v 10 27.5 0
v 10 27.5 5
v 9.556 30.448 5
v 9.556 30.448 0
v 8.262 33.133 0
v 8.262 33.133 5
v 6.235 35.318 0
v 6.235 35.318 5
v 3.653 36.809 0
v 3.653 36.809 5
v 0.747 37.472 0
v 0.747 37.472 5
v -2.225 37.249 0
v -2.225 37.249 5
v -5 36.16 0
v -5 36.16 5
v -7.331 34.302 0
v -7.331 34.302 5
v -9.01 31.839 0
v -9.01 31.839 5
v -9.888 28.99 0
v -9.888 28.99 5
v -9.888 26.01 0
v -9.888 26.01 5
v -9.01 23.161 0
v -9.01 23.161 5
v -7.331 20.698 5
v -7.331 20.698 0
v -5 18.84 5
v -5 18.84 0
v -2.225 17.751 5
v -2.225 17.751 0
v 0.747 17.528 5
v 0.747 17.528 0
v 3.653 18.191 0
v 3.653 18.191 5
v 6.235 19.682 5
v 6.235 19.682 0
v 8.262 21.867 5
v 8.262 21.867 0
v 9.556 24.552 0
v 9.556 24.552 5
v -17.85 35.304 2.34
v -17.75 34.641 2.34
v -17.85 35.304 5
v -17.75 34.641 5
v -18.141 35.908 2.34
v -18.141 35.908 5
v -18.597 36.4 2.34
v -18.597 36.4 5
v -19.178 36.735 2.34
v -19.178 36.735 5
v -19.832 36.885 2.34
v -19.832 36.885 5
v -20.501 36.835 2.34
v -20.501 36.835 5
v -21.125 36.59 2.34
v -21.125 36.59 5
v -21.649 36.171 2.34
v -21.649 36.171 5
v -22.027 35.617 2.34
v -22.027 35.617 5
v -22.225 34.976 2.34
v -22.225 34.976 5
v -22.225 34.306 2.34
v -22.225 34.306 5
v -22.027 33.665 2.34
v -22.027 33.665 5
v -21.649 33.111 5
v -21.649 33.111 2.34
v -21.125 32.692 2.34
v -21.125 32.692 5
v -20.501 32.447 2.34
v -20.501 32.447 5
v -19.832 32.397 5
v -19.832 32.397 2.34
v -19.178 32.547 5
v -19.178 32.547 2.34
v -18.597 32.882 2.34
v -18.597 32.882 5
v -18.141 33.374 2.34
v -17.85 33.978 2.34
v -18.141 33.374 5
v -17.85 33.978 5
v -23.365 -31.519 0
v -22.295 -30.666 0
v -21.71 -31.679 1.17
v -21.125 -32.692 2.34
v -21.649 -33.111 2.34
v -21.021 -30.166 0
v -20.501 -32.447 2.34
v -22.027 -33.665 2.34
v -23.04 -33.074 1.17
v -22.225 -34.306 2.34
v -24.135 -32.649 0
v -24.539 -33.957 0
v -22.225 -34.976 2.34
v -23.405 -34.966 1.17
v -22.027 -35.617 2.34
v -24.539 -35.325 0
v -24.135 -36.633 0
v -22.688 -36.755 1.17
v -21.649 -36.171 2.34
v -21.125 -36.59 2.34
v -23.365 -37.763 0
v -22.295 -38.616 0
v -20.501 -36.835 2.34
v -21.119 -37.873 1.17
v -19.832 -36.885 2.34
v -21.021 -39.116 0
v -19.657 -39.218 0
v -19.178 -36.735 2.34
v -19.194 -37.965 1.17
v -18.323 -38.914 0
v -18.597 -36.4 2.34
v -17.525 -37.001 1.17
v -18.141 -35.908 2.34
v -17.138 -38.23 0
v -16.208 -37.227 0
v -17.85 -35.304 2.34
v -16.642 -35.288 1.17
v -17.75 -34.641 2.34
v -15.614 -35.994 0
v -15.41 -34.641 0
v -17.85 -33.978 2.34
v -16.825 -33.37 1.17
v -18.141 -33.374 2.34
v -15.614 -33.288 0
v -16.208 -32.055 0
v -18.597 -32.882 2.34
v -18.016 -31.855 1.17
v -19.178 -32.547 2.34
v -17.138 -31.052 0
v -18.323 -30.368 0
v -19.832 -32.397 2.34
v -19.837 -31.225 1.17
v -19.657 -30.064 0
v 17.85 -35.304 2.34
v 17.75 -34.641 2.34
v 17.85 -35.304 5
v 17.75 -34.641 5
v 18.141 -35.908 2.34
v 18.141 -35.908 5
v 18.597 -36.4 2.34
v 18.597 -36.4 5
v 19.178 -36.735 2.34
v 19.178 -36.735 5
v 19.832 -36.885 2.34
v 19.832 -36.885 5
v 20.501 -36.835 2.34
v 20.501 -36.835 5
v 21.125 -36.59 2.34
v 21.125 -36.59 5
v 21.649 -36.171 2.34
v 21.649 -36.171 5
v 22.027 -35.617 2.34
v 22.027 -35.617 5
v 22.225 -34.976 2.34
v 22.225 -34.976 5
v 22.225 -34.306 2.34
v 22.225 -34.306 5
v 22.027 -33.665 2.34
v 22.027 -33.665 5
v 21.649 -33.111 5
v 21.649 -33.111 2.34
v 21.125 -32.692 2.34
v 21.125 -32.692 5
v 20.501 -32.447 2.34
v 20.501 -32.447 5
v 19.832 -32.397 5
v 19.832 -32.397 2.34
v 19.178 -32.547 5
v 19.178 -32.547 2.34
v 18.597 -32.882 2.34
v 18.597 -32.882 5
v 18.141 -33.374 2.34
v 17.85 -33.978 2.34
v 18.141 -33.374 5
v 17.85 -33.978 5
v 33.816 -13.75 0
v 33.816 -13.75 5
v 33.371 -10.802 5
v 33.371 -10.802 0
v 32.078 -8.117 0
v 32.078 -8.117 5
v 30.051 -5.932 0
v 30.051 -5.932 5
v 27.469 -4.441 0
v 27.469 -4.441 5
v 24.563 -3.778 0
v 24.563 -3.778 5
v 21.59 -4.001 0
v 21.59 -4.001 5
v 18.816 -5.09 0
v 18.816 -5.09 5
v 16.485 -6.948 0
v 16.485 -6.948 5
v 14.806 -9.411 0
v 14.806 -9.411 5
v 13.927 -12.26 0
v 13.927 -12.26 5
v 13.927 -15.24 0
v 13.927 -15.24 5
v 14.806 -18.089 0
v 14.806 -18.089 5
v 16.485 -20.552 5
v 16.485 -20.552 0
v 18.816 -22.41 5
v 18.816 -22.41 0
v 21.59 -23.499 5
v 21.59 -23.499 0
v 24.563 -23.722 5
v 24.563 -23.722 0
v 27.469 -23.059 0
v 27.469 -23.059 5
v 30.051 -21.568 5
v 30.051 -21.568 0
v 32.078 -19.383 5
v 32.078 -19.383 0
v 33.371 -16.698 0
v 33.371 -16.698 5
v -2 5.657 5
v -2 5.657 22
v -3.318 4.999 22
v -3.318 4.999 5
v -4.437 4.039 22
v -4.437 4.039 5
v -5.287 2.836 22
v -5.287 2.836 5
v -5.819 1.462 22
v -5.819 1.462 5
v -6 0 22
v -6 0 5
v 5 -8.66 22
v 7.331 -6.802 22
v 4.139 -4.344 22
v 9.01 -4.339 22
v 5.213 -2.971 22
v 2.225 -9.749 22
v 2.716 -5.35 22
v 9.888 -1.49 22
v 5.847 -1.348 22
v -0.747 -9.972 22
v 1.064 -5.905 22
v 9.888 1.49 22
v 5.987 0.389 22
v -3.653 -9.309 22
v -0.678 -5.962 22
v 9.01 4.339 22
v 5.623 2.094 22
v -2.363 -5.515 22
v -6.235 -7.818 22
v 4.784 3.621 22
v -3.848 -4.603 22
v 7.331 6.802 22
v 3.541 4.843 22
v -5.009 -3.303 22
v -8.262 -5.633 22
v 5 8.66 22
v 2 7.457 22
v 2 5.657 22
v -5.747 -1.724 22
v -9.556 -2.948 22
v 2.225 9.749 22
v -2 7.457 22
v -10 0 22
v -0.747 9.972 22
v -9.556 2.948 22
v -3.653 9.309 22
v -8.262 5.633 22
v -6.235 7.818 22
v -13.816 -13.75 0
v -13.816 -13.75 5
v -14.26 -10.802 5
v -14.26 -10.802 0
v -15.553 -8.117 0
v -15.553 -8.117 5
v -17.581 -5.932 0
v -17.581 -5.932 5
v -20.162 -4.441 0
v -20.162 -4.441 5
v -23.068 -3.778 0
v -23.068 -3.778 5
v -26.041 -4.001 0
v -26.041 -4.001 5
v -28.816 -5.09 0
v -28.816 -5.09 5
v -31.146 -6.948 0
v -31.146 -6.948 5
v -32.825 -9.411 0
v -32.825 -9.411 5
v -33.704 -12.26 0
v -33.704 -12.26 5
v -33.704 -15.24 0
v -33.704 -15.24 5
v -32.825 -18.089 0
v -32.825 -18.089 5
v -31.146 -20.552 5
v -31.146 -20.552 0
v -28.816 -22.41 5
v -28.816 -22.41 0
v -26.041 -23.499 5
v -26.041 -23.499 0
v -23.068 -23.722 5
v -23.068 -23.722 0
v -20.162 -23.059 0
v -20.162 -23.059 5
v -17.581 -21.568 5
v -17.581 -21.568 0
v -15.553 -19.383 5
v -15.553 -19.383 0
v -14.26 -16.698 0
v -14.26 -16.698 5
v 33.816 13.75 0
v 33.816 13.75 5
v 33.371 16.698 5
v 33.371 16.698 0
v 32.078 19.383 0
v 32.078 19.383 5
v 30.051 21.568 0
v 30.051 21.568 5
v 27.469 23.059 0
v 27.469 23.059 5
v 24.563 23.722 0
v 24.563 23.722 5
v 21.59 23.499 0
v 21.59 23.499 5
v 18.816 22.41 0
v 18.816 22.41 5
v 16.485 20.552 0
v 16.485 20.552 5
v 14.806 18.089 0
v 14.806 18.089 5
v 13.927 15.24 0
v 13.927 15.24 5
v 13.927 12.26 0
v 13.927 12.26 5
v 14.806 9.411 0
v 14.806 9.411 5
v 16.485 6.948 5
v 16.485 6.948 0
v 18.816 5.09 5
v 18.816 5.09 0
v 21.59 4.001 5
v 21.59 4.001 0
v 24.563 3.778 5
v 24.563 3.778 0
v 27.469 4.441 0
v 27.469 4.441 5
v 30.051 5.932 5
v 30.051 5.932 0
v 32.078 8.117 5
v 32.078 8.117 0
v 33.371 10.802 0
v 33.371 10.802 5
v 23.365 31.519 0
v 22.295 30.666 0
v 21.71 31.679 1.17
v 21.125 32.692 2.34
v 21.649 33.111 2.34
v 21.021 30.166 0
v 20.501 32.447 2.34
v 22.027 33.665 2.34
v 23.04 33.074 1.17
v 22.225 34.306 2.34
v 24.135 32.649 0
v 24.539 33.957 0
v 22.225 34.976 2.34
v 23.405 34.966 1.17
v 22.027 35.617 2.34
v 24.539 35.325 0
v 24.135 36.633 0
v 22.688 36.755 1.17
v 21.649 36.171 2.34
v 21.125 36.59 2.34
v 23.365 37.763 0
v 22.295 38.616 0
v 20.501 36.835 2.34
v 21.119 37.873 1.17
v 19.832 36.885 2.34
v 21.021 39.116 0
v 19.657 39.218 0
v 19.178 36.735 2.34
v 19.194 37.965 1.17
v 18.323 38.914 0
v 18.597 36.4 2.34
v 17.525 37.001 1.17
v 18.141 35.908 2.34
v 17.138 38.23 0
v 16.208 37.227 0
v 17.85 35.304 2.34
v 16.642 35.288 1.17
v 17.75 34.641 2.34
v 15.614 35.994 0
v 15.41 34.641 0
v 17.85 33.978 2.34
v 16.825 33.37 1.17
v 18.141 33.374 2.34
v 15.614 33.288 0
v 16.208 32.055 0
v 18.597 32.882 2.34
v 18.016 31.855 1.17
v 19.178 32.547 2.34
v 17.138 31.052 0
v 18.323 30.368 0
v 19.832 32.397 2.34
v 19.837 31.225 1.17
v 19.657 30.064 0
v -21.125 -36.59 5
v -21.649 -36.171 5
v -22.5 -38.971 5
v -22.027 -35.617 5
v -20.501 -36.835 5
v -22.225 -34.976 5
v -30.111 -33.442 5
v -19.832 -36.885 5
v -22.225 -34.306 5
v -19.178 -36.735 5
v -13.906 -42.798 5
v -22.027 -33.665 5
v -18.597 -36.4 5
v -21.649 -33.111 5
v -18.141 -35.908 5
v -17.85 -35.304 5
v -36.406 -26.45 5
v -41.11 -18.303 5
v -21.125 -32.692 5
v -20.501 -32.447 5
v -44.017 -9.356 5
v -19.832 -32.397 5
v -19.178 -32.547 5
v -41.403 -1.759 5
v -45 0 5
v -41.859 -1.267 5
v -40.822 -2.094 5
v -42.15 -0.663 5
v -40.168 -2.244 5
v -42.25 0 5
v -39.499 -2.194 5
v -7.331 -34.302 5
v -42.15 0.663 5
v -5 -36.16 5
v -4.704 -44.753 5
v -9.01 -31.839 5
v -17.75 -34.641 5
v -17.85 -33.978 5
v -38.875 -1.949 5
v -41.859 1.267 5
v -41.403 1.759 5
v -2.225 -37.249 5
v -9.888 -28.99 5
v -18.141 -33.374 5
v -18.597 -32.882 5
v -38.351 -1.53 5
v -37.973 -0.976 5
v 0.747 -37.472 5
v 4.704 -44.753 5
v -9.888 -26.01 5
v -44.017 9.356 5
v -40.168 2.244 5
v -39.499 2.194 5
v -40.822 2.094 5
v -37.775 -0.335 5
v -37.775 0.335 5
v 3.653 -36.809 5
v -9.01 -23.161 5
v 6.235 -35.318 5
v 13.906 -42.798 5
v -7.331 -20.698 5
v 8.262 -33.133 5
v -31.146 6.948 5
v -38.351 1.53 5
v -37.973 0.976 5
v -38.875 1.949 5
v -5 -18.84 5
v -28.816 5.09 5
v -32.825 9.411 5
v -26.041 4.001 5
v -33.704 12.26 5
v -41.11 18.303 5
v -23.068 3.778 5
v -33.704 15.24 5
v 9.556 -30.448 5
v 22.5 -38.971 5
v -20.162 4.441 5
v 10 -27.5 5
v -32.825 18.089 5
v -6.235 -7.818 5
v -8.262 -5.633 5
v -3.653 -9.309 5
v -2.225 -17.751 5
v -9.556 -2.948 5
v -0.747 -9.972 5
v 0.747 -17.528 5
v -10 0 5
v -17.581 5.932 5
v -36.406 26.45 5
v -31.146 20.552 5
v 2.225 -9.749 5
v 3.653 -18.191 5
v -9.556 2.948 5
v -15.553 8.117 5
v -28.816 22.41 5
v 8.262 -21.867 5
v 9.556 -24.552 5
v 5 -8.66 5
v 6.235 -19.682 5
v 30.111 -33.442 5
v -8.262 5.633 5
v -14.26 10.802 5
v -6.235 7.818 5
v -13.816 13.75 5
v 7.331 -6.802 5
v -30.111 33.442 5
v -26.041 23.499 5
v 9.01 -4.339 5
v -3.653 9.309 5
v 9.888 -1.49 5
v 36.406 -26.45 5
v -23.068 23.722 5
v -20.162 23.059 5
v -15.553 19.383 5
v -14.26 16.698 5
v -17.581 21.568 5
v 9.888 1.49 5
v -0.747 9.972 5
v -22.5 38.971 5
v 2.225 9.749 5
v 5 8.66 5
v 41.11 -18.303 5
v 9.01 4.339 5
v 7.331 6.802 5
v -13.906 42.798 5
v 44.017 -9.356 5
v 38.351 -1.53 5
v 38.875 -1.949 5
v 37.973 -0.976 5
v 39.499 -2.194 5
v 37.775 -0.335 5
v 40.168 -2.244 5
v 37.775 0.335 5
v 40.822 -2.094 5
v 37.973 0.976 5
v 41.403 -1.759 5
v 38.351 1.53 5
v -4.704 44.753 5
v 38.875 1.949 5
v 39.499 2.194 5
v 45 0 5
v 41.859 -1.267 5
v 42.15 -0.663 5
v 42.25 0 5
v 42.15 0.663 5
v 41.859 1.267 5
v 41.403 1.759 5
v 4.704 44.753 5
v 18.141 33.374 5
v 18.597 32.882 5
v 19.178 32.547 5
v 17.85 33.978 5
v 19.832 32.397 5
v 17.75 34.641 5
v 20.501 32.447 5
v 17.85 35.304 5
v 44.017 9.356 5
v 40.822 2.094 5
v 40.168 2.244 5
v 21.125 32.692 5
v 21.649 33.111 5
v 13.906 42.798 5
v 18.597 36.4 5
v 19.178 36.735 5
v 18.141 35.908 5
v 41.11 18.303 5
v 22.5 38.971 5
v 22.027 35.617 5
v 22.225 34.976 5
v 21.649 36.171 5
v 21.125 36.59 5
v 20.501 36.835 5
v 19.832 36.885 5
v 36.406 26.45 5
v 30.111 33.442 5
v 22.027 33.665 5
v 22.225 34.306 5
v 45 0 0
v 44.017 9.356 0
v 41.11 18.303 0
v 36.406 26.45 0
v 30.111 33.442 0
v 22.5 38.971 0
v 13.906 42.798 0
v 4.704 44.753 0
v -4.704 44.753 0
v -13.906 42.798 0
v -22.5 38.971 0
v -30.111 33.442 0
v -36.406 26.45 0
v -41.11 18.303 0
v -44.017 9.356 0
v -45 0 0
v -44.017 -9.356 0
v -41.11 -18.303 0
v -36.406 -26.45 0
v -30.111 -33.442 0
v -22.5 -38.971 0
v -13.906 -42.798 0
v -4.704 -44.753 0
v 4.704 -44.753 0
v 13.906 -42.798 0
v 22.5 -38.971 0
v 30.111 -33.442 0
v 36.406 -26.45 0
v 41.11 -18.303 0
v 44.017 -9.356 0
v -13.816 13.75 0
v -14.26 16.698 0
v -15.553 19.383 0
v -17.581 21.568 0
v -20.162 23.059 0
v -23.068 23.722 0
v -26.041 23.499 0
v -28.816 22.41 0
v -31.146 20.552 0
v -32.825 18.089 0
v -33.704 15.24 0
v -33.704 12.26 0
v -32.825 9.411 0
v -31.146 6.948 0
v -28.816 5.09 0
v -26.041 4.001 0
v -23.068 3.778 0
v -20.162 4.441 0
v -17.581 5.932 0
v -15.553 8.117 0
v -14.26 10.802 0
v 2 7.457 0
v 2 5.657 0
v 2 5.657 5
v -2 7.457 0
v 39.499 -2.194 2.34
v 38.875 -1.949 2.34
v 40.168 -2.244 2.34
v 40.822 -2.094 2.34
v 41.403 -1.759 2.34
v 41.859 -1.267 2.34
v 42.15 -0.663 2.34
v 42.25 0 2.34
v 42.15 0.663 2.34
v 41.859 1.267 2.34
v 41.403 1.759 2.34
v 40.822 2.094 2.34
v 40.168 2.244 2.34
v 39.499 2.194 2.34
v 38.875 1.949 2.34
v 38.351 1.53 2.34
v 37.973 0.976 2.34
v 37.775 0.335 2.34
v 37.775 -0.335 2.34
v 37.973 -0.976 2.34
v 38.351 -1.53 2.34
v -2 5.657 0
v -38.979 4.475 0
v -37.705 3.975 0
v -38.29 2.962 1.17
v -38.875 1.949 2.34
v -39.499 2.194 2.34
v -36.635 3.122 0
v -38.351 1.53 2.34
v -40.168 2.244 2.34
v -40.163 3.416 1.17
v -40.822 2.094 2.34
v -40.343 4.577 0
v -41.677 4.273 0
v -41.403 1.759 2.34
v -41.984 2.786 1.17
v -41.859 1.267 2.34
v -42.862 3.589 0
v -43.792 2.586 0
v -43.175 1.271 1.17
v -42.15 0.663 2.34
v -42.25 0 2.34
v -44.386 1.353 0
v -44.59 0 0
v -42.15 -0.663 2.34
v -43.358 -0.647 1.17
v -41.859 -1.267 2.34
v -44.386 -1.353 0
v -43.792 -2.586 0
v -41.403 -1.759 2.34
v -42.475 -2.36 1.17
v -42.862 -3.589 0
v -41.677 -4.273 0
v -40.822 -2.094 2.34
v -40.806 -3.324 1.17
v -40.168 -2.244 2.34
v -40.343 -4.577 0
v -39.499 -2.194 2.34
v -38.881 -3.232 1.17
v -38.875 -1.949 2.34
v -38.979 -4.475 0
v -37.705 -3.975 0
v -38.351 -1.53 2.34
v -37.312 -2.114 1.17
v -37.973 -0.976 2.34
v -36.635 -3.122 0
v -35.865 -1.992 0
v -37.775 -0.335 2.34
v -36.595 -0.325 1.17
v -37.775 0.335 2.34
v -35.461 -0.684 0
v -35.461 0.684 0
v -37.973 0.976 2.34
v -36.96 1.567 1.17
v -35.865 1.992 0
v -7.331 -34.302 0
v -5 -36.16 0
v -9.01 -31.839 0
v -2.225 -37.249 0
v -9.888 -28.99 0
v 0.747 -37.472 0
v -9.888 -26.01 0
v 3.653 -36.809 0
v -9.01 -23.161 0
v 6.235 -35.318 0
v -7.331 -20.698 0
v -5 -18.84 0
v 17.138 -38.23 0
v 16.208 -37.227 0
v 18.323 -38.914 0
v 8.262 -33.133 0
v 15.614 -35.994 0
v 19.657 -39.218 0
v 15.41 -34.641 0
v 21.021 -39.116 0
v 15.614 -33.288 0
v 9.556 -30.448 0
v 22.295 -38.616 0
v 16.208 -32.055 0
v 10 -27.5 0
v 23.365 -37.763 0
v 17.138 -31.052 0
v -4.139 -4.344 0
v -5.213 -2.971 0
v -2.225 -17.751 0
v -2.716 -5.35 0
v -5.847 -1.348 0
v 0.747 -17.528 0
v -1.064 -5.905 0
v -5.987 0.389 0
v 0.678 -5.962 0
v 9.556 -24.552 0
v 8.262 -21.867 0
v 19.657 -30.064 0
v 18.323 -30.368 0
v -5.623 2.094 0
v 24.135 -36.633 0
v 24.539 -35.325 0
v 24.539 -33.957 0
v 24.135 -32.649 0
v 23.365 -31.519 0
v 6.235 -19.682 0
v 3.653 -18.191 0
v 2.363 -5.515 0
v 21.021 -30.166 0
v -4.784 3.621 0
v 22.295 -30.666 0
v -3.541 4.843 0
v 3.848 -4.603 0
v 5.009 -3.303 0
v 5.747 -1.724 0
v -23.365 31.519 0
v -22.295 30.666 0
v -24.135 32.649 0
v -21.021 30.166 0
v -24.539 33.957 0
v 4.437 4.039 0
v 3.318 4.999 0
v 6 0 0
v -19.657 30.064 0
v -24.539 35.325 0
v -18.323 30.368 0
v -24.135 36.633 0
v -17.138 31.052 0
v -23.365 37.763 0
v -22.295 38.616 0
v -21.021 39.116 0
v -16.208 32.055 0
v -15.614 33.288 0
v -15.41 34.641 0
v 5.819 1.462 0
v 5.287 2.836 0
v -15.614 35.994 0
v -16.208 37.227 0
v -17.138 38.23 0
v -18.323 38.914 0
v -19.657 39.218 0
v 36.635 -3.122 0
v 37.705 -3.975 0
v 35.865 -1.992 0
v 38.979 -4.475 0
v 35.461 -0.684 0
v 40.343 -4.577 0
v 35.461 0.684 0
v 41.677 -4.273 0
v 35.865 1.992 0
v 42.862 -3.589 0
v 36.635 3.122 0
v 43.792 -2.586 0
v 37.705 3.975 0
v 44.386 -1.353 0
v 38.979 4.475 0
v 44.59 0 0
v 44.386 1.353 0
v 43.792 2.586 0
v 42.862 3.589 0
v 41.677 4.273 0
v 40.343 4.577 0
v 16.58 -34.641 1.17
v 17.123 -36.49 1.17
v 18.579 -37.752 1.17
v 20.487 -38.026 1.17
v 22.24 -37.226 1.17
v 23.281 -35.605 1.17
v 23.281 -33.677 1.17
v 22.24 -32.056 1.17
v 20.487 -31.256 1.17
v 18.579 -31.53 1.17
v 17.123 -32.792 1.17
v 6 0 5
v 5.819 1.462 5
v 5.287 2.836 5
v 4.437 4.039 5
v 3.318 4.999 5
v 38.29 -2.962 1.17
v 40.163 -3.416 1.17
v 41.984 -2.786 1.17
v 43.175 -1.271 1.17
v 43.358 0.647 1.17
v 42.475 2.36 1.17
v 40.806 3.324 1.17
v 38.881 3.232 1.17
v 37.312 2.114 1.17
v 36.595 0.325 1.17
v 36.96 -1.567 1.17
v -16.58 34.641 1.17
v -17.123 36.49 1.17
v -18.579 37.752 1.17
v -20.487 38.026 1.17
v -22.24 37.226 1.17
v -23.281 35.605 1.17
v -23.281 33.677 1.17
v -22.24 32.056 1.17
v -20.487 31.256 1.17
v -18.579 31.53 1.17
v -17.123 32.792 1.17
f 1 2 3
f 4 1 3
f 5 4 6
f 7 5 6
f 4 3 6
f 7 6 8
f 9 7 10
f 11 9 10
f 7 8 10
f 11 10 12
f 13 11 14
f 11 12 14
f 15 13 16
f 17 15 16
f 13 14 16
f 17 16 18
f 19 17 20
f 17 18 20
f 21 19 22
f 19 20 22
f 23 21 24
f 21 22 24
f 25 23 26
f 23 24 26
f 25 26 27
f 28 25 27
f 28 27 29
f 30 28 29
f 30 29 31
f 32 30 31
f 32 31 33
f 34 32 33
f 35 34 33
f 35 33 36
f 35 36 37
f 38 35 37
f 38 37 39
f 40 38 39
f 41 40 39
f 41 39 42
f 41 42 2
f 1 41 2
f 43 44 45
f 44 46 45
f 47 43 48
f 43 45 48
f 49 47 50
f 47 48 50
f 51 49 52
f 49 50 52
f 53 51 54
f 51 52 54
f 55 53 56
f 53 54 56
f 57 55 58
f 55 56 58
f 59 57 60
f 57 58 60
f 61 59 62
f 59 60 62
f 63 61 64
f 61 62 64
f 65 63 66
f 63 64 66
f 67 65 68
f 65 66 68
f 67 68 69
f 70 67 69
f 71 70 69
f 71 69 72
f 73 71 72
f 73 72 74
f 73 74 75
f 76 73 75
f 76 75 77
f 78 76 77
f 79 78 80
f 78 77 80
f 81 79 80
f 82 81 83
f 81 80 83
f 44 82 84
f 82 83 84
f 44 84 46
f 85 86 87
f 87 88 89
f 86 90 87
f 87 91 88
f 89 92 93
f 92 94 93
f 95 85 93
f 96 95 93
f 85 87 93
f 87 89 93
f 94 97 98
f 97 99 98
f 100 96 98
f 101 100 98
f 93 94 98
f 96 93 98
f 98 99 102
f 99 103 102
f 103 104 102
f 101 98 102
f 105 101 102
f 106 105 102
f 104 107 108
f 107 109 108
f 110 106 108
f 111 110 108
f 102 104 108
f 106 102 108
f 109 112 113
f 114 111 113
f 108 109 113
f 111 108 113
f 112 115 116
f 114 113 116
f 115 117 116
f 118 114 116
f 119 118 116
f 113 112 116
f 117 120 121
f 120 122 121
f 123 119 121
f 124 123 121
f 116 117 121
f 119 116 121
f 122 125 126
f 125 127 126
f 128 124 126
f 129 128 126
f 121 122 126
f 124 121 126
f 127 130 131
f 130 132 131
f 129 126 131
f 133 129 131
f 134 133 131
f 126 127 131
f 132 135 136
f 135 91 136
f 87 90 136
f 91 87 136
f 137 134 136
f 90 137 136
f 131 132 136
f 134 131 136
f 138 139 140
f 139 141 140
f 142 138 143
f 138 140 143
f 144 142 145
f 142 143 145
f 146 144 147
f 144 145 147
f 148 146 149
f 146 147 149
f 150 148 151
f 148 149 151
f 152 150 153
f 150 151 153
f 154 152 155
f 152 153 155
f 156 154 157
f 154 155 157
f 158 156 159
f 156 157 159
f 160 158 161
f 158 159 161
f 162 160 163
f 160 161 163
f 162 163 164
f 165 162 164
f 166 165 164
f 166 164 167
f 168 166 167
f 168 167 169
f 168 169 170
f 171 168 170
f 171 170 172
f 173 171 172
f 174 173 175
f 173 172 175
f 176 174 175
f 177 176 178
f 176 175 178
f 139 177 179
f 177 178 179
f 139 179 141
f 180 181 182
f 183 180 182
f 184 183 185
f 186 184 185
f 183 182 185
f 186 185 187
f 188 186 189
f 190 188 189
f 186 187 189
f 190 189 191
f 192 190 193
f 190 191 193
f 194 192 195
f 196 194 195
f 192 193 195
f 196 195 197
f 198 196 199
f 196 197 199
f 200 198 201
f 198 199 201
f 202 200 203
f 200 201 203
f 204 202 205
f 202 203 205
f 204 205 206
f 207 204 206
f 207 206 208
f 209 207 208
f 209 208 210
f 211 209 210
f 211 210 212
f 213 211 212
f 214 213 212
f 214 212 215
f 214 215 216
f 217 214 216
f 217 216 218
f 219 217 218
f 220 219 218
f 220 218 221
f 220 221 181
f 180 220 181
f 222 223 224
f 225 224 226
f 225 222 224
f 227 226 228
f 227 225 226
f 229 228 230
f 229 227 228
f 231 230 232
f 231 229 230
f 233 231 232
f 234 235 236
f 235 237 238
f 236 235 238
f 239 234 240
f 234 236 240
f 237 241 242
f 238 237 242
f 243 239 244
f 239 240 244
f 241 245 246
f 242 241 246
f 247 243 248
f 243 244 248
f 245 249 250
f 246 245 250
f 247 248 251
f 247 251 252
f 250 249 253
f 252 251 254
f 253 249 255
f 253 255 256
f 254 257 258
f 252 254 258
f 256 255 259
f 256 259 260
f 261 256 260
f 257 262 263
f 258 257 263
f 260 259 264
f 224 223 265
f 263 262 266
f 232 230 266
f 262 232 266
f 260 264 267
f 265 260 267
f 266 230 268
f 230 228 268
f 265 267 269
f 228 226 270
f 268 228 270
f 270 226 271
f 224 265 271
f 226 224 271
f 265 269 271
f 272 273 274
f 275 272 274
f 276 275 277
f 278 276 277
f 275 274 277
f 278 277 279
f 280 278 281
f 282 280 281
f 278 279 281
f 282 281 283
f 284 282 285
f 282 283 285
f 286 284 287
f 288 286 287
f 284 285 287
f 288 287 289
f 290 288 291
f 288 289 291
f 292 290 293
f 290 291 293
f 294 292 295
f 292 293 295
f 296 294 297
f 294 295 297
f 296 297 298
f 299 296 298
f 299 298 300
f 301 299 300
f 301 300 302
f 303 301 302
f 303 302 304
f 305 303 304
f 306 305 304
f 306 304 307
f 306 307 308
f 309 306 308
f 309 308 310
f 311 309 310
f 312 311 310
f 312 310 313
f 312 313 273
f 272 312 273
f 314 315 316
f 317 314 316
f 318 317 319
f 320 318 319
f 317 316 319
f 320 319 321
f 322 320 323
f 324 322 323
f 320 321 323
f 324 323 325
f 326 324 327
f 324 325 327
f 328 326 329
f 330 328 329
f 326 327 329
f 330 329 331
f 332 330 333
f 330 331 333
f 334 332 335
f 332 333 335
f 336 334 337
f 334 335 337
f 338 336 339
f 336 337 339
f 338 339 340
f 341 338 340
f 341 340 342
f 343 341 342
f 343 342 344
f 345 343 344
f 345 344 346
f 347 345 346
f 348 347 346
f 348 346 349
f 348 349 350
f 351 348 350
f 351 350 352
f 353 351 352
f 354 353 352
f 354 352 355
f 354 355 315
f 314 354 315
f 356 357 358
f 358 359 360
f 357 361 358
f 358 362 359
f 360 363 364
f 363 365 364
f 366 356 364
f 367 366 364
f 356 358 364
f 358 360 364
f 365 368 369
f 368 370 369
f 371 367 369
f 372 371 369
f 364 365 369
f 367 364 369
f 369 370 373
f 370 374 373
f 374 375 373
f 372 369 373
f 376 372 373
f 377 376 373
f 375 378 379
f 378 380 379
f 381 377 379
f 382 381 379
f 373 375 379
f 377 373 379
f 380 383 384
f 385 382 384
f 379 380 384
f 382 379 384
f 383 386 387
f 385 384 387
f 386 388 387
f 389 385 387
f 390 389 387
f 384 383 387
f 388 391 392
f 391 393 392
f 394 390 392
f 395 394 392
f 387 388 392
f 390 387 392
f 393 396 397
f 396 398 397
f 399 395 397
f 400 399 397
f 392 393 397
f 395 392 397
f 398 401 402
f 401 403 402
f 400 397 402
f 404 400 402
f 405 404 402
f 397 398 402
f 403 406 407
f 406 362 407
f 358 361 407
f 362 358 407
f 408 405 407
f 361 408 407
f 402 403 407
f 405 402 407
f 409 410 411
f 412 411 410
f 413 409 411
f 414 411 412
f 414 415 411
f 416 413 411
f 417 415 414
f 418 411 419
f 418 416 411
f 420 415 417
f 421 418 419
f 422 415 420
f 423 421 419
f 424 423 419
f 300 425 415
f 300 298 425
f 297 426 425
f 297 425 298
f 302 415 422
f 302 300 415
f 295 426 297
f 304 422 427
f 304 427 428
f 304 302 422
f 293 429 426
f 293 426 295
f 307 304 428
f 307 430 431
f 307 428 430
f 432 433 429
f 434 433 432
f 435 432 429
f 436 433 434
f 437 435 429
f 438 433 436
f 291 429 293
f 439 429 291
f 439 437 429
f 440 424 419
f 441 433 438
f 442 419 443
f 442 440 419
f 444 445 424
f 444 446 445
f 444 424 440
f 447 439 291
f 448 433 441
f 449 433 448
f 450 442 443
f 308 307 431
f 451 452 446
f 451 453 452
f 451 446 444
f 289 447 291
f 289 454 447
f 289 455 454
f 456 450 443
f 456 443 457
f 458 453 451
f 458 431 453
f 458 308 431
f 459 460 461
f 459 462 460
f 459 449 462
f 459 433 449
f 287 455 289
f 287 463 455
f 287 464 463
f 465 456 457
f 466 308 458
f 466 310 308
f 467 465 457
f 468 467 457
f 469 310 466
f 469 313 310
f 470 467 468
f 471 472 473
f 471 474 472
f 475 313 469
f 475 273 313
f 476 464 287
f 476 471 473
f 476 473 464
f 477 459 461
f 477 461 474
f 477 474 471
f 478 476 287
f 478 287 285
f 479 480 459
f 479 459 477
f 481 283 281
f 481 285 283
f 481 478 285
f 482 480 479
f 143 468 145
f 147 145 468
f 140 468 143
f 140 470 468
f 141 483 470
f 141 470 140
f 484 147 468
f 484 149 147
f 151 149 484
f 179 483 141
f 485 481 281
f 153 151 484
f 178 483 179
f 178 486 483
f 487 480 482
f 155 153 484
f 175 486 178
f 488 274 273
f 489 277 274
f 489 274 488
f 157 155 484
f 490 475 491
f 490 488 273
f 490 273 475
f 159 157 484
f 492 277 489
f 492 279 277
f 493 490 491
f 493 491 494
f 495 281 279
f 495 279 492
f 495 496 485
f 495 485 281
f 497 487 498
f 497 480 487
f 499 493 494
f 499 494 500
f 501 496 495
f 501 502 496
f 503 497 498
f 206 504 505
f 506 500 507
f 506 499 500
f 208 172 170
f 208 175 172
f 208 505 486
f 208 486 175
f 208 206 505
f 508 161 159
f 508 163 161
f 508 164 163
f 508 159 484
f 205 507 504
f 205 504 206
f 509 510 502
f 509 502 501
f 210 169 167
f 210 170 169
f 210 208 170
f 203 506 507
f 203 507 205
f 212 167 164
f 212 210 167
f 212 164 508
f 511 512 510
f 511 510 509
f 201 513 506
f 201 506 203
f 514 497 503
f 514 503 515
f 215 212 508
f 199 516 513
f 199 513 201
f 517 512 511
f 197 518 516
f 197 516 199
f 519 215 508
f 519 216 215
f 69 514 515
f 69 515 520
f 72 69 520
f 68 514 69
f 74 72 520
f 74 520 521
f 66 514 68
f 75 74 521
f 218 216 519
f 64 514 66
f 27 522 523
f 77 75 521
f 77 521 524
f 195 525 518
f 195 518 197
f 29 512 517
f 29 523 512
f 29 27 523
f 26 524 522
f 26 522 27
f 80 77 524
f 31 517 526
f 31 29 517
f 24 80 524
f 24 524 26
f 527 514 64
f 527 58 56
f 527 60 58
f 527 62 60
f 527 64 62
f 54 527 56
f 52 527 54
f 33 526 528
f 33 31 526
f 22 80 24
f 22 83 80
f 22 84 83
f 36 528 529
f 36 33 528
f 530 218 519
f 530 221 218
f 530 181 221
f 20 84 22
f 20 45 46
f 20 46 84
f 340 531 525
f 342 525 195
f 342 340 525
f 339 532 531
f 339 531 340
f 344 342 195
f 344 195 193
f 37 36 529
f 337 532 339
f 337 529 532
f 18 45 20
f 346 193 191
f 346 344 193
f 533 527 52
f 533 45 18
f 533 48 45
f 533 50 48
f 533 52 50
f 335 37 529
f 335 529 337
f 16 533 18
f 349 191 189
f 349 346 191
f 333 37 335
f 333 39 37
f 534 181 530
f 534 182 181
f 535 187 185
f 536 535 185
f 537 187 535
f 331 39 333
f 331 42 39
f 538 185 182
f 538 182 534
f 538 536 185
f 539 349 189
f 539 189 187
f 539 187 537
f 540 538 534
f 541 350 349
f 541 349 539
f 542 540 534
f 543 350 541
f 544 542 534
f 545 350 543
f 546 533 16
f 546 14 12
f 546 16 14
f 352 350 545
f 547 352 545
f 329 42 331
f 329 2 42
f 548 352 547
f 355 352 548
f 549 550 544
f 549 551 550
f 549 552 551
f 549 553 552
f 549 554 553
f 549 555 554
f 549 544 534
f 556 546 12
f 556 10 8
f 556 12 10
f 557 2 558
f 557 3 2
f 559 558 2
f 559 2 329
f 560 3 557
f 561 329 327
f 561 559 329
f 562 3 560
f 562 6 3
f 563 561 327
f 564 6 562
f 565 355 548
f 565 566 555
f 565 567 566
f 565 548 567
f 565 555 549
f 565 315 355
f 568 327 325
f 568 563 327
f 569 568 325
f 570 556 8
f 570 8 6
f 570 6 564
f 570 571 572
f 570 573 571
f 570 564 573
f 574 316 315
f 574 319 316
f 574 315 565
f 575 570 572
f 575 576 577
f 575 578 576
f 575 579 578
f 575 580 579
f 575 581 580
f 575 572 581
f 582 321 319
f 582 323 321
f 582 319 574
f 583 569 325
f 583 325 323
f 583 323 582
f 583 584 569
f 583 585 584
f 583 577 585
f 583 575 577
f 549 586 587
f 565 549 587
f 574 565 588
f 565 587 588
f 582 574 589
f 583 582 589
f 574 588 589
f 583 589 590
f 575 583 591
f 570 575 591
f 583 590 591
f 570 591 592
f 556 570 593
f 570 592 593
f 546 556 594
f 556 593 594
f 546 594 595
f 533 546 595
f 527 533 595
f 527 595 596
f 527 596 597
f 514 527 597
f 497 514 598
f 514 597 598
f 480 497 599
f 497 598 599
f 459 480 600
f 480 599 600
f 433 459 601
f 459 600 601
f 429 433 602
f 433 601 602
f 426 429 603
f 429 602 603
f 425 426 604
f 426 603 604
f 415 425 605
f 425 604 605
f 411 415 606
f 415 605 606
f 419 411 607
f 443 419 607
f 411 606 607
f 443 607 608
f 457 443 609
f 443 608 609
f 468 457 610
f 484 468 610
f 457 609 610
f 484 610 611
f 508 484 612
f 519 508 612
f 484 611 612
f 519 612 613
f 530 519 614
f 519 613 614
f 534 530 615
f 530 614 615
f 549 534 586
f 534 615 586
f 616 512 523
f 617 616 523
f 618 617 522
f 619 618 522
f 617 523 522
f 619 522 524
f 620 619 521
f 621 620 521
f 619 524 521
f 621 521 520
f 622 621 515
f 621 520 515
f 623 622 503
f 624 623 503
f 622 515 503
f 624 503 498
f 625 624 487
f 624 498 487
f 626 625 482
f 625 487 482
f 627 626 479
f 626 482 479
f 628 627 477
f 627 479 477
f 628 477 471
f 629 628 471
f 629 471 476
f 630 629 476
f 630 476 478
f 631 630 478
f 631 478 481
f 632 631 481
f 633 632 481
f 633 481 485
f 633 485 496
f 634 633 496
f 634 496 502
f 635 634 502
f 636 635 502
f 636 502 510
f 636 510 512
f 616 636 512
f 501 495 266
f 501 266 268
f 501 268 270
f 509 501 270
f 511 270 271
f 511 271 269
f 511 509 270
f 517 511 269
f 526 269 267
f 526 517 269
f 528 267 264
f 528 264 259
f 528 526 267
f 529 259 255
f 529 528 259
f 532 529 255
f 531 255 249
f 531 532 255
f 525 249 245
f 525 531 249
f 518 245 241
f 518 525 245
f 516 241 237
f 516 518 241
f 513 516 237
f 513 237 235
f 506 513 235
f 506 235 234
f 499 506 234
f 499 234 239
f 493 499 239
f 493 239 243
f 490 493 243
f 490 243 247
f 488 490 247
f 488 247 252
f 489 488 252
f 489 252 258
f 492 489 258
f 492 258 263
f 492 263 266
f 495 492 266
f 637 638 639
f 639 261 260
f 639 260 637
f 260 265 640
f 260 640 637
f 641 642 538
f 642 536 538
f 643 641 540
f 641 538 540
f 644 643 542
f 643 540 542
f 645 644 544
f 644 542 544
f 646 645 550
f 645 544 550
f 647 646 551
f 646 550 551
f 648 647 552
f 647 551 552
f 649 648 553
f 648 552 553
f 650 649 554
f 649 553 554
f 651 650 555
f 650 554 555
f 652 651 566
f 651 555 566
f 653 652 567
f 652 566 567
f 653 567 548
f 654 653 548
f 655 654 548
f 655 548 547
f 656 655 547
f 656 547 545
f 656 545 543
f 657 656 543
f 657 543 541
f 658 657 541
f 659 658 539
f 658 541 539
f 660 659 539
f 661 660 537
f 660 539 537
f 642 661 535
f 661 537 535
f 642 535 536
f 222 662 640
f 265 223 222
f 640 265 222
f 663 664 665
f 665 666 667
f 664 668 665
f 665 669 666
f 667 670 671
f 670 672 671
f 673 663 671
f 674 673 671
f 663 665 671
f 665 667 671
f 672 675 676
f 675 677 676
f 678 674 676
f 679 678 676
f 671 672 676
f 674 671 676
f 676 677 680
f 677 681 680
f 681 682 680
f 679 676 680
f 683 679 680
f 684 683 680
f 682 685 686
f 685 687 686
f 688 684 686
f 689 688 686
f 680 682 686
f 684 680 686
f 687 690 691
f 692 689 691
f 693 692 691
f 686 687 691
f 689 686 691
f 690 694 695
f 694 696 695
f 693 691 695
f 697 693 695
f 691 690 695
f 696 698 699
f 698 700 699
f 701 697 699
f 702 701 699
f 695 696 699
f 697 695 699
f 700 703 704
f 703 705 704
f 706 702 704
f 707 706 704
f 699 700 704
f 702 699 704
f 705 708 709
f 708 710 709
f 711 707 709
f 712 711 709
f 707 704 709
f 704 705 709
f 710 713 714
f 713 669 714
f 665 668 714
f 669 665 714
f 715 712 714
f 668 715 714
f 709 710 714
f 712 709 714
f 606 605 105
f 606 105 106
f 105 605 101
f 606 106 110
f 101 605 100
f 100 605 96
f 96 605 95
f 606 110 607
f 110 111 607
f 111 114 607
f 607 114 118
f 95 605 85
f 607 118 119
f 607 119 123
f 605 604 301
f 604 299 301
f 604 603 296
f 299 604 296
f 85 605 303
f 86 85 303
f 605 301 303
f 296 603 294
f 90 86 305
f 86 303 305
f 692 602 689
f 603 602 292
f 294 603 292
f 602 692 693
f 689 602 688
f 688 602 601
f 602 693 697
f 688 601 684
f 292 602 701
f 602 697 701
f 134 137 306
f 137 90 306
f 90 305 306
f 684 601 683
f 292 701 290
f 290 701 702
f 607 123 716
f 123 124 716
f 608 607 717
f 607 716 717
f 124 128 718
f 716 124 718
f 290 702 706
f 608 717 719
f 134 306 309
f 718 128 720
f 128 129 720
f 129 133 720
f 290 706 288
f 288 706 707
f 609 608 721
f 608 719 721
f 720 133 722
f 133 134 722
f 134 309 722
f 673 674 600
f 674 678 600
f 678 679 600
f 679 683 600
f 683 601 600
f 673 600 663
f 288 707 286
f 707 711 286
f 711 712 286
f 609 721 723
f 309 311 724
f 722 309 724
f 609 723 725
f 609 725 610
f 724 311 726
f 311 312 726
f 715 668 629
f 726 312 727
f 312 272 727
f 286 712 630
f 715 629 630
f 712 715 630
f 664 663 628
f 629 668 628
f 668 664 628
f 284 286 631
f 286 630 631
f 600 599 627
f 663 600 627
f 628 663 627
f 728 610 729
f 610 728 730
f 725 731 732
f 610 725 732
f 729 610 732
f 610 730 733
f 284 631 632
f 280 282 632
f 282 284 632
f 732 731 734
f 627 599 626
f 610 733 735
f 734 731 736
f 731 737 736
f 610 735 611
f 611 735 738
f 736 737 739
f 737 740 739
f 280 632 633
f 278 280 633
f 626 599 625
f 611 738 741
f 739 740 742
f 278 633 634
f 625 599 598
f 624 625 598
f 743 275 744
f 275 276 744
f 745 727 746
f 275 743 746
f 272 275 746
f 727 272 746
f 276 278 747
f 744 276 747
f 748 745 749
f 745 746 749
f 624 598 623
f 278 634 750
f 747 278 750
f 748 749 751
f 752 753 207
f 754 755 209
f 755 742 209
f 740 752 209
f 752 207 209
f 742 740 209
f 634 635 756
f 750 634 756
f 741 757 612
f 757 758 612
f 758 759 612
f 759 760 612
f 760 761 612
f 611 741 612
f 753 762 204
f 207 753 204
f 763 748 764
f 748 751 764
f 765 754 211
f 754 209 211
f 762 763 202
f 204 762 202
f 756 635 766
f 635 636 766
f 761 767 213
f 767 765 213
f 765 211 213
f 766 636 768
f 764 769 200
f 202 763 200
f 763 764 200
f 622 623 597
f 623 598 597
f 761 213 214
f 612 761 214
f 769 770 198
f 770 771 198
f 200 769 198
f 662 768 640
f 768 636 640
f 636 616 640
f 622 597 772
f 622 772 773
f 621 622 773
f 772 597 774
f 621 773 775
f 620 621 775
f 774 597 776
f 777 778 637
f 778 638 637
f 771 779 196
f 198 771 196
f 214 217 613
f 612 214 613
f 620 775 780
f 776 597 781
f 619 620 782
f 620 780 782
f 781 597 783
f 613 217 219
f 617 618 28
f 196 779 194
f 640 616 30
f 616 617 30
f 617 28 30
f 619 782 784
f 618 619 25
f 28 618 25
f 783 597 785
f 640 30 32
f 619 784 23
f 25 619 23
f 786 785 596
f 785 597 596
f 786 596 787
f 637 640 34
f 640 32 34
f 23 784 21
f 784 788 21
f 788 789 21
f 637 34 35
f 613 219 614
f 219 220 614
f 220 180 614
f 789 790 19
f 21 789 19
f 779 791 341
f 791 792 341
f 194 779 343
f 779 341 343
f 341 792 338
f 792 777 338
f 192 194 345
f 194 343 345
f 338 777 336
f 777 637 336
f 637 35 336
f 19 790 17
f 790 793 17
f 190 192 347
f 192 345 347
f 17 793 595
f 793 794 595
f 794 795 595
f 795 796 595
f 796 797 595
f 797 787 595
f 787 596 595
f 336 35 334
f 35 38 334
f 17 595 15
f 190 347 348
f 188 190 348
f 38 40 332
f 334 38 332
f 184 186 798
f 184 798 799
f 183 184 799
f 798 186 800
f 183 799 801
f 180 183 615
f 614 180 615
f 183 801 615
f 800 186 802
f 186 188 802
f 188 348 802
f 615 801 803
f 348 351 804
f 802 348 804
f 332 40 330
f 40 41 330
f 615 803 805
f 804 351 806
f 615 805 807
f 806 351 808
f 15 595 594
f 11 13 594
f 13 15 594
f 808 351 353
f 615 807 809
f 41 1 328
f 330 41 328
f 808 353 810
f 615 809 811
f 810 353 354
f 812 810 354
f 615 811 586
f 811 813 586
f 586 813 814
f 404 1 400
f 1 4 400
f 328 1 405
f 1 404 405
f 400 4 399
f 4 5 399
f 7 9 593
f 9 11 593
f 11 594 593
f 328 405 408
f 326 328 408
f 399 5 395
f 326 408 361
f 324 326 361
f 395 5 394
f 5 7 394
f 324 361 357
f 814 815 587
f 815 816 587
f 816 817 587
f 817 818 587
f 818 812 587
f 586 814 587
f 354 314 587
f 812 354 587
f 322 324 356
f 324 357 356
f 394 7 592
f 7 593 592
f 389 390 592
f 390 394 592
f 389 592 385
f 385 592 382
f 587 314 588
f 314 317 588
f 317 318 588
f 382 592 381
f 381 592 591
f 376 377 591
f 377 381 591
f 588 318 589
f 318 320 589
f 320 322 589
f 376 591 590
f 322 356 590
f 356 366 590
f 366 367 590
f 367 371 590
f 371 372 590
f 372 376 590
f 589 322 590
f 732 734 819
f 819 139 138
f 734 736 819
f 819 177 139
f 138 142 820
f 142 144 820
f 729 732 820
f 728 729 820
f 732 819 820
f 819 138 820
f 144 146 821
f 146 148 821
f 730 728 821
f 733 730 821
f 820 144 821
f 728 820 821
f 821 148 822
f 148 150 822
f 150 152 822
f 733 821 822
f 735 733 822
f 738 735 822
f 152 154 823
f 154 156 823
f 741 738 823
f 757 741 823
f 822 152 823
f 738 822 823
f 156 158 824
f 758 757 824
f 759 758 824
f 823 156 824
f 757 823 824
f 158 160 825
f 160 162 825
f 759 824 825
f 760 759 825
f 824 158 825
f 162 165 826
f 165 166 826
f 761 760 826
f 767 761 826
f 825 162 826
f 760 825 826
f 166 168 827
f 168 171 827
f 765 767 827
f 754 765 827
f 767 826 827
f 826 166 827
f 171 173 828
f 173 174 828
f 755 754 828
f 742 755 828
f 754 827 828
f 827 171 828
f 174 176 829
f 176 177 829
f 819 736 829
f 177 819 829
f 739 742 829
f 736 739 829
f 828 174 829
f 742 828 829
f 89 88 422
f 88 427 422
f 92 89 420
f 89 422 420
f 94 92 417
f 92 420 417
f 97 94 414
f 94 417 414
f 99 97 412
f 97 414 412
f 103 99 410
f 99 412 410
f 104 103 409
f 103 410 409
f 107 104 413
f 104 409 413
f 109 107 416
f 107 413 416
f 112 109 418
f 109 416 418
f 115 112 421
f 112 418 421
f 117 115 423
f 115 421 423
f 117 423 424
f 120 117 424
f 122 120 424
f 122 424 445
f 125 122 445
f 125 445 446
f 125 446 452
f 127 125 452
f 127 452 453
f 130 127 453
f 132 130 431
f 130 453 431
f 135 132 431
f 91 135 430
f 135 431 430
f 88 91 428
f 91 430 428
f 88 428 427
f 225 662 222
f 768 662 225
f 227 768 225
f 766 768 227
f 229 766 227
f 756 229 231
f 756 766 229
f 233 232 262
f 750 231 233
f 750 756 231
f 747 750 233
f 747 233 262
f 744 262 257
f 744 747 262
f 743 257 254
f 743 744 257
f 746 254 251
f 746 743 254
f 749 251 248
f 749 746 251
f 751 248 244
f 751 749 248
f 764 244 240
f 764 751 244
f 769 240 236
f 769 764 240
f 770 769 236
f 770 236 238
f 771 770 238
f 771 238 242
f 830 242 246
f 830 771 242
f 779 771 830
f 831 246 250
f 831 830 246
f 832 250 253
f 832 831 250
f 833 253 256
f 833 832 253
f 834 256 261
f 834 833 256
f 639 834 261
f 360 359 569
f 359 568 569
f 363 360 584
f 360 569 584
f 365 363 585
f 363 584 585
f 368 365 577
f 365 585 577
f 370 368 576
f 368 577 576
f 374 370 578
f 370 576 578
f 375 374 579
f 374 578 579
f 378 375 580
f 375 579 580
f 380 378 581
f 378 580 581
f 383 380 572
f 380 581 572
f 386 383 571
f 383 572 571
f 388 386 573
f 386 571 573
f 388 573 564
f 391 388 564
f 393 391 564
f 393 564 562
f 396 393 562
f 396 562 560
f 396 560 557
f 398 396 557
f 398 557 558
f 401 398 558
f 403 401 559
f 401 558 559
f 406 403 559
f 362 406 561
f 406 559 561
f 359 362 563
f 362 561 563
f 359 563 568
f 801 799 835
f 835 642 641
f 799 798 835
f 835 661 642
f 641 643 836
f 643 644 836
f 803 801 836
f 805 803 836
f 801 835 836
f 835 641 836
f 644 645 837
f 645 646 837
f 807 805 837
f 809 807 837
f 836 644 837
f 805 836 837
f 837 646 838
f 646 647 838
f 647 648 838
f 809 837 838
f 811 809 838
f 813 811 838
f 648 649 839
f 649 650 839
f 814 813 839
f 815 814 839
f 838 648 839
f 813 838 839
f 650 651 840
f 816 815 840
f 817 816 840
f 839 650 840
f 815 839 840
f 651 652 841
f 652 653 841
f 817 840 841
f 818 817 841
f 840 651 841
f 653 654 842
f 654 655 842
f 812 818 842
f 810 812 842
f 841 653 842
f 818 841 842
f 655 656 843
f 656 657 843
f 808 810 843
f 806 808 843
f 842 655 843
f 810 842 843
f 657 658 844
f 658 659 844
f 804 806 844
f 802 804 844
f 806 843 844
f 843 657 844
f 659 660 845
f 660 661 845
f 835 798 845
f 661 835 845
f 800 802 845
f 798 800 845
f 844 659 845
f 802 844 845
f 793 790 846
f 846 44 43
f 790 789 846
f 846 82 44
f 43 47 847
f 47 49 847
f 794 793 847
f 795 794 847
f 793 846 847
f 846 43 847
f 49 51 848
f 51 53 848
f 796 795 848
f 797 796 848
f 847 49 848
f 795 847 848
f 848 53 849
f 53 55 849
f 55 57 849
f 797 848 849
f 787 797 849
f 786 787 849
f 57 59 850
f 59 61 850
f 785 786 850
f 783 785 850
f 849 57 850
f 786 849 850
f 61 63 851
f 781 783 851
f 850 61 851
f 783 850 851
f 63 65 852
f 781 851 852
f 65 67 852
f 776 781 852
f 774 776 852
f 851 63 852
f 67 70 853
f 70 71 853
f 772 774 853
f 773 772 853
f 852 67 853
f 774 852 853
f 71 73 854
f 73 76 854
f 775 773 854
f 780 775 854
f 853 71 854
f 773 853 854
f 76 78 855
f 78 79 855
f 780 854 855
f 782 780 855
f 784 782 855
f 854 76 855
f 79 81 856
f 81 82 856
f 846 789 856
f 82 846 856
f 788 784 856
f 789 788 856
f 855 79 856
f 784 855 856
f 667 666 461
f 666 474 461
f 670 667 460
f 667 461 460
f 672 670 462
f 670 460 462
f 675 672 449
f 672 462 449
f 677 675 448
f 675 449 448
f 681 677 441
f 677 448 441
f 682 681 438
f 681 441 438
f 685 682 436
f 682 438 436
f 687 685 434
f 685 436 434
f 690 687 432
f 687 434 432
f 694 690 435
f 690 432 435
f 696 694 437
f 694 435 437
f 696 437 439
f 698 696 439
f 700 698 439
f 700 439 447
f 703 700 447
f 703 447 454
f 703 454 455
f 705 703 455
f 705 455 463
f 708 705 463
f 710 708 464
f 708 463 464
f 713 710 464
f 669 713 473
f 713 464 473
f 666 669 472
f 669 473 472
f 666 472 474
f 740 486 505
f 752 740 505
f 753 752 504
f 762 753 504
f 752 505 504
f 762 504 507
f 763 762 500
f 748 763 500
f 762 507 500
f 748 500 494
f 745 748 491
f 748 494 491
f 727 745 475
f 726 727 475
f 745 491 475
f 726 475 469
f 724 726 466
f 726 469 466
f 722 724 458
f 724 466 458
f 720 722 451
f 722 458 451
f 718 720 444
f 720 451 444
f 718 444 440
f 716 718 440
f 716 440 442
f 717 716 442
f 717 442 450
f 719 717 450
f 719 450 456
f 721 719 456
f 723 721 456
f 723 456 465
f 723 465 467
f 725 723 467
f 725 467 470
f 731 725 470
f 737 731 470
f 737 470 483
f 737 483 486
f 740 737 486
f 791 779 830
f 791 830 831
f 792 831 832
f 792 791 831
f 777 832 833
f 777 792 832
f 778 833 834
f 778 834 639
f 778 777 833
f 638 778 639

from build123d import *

# Parameters (mm, degrees)
SKETCH1_R                                            = 45
SKETCH1_R_2                                          = 6
EXTRUDE1_DEPTH                                       = 5
SKETCH2_R                                            = 10
SKETCH2_R_2                                          = 6
EXTRUDE2_DEPTH                                       = 22
SKETCH4_R                                            = 10
CUT_EXTRUDE2_DEPTH                                   = 100
SKETCH5_W                                            = 4
SKETCH5_H                                            = 1.8
CUT_EXTRUDE3_DEPTH                                   = 50
SKETCH6_R                                            = 2
CUT_EXTRUDE4_DEPTH                                   = 15
CSK_FOR_M4_HEX_SOCKET_COUNTERSUNK_HEAD_S_D           = 4.5
CSK_FOR_M4_HEX_SOCKET_COUNTERSUNK_HEAD_S_CSINK_D     = 9.18
CSK_FOR_M4_HEX_SOCKET_COUNTERSUNK_HEAD_S_CSINK_ANGLE = 90
CIRPATTERN1_COUNT                                    = 6


with BuildPart() as part:
    # Sketch1 → Extrude1 (new body)
    with BuildSketch(Plane.XY):
        Circle(SKETCH1_R)
        Circle(SKETCH1_R_2, mode=Mode.SUBTRACT)
    extrude(amount=EXTRUDE1_DEPTH)

    # Sketch2 → Extrude2 (add)
    with BuildSketch(Plane(origin=(0, 0, 0), x_dir=(-1, 0, 0), z_dir=(0, 0, -1))):
        Circle(SKETCH2_R)
        Circle(SKETCH2_R_2, mode=Mode.SUBTRACT)
    extrude(amount=-EXTRUDE2_DEPTH)

    # Sketch4 → Cut-Extrude2 (cut)
    with BuildSketch(Plane.XY.offset(5)):
        with Locations((23.815698604, 13.75)):
            Circle(SKETCH4_R)
        with Locations((0, 27.5)):
            Circle(SKETCH4_R)
        with Locations((23.815698604, -13.75)):
            Circle(SKETCH4_R)
        with Locations((0, -27.5)):
            Circle(SKETCH4_R)
        with Locations((-23.815698604, -13.75)):
            Circle(SKETCH4_R)
        with Locations((-23.815698604, 13.75)):
            Circle(SKETCH4_R)
    extrude(amount=-CUT_EXTRUDE2_DEPTH, mode=Mode.SUBTRACT)

    # Sketch5 → Cut-Extrude3 (cut)
    with BuildSketch(Plane.XY.offset(22)):
        with Locations((0, 6.556854249)):
            Rectangle(SKETCH5_W, SKETCH5_H)
    extrude(amount=-CUT_EXTRUDE3_DEPTH, mode=Mode.SUBTRACT)

    # Sketch6 → Cut-Extrude4 (cut)
    with BuildSketch(Plane(origin=(0, 0, 0), x_dir=(-1, 0, 0), z_dir=(0, 0, -1))):
        with Locations((20, 34.641016151)):
            Circle(SKETCH6_R)
    extrude(amount=-CUT_EXTRUDE4_DEPTH, mode=Mode.SUBTRACT)

    # CSK for M4 Hex Socket Countersunk Head Screw1 (through all)
    with Locations(Plane(origin=(-20, 34.641016151, 0), x_dir=(-1, 0, 0), z_dir=(0, 0, -1))):
        with Locations((0, 0)):
            csk_for_m4_hex_socket_countersunk_head_s = CounterSinkHole(CSK_FOR_M4_HEX_SOCKET_COUNTERSUNK_HEAD_S_D / 2, CSK_FOR_M4_HEX_SOCKET_COUNTERSUNK_HEAD_S_CSINK_D / 2, counter_sink_angle=CSK_FOR_M4_HEX_SOCKET_COUNTERSUNK_HEAD_S_CSINK_ANGLE)

    # CirPattern1: CSK for M4 Hex Socket Countersunk Head Screw1 ×6 about axis
    cirpattern1_axis = Axis((0, 0, 22), (0, 0, -1))
    for i in range(1, CIRPATTERN1_COUNT):
        add(csk_for_m4_hex_socket_countersunk_head_s.rotate(cirpattern1_axis, i * 360 / CIRPATTERN1_COUNT), mode=Mode.SUBTRACT)


solid = part.part
